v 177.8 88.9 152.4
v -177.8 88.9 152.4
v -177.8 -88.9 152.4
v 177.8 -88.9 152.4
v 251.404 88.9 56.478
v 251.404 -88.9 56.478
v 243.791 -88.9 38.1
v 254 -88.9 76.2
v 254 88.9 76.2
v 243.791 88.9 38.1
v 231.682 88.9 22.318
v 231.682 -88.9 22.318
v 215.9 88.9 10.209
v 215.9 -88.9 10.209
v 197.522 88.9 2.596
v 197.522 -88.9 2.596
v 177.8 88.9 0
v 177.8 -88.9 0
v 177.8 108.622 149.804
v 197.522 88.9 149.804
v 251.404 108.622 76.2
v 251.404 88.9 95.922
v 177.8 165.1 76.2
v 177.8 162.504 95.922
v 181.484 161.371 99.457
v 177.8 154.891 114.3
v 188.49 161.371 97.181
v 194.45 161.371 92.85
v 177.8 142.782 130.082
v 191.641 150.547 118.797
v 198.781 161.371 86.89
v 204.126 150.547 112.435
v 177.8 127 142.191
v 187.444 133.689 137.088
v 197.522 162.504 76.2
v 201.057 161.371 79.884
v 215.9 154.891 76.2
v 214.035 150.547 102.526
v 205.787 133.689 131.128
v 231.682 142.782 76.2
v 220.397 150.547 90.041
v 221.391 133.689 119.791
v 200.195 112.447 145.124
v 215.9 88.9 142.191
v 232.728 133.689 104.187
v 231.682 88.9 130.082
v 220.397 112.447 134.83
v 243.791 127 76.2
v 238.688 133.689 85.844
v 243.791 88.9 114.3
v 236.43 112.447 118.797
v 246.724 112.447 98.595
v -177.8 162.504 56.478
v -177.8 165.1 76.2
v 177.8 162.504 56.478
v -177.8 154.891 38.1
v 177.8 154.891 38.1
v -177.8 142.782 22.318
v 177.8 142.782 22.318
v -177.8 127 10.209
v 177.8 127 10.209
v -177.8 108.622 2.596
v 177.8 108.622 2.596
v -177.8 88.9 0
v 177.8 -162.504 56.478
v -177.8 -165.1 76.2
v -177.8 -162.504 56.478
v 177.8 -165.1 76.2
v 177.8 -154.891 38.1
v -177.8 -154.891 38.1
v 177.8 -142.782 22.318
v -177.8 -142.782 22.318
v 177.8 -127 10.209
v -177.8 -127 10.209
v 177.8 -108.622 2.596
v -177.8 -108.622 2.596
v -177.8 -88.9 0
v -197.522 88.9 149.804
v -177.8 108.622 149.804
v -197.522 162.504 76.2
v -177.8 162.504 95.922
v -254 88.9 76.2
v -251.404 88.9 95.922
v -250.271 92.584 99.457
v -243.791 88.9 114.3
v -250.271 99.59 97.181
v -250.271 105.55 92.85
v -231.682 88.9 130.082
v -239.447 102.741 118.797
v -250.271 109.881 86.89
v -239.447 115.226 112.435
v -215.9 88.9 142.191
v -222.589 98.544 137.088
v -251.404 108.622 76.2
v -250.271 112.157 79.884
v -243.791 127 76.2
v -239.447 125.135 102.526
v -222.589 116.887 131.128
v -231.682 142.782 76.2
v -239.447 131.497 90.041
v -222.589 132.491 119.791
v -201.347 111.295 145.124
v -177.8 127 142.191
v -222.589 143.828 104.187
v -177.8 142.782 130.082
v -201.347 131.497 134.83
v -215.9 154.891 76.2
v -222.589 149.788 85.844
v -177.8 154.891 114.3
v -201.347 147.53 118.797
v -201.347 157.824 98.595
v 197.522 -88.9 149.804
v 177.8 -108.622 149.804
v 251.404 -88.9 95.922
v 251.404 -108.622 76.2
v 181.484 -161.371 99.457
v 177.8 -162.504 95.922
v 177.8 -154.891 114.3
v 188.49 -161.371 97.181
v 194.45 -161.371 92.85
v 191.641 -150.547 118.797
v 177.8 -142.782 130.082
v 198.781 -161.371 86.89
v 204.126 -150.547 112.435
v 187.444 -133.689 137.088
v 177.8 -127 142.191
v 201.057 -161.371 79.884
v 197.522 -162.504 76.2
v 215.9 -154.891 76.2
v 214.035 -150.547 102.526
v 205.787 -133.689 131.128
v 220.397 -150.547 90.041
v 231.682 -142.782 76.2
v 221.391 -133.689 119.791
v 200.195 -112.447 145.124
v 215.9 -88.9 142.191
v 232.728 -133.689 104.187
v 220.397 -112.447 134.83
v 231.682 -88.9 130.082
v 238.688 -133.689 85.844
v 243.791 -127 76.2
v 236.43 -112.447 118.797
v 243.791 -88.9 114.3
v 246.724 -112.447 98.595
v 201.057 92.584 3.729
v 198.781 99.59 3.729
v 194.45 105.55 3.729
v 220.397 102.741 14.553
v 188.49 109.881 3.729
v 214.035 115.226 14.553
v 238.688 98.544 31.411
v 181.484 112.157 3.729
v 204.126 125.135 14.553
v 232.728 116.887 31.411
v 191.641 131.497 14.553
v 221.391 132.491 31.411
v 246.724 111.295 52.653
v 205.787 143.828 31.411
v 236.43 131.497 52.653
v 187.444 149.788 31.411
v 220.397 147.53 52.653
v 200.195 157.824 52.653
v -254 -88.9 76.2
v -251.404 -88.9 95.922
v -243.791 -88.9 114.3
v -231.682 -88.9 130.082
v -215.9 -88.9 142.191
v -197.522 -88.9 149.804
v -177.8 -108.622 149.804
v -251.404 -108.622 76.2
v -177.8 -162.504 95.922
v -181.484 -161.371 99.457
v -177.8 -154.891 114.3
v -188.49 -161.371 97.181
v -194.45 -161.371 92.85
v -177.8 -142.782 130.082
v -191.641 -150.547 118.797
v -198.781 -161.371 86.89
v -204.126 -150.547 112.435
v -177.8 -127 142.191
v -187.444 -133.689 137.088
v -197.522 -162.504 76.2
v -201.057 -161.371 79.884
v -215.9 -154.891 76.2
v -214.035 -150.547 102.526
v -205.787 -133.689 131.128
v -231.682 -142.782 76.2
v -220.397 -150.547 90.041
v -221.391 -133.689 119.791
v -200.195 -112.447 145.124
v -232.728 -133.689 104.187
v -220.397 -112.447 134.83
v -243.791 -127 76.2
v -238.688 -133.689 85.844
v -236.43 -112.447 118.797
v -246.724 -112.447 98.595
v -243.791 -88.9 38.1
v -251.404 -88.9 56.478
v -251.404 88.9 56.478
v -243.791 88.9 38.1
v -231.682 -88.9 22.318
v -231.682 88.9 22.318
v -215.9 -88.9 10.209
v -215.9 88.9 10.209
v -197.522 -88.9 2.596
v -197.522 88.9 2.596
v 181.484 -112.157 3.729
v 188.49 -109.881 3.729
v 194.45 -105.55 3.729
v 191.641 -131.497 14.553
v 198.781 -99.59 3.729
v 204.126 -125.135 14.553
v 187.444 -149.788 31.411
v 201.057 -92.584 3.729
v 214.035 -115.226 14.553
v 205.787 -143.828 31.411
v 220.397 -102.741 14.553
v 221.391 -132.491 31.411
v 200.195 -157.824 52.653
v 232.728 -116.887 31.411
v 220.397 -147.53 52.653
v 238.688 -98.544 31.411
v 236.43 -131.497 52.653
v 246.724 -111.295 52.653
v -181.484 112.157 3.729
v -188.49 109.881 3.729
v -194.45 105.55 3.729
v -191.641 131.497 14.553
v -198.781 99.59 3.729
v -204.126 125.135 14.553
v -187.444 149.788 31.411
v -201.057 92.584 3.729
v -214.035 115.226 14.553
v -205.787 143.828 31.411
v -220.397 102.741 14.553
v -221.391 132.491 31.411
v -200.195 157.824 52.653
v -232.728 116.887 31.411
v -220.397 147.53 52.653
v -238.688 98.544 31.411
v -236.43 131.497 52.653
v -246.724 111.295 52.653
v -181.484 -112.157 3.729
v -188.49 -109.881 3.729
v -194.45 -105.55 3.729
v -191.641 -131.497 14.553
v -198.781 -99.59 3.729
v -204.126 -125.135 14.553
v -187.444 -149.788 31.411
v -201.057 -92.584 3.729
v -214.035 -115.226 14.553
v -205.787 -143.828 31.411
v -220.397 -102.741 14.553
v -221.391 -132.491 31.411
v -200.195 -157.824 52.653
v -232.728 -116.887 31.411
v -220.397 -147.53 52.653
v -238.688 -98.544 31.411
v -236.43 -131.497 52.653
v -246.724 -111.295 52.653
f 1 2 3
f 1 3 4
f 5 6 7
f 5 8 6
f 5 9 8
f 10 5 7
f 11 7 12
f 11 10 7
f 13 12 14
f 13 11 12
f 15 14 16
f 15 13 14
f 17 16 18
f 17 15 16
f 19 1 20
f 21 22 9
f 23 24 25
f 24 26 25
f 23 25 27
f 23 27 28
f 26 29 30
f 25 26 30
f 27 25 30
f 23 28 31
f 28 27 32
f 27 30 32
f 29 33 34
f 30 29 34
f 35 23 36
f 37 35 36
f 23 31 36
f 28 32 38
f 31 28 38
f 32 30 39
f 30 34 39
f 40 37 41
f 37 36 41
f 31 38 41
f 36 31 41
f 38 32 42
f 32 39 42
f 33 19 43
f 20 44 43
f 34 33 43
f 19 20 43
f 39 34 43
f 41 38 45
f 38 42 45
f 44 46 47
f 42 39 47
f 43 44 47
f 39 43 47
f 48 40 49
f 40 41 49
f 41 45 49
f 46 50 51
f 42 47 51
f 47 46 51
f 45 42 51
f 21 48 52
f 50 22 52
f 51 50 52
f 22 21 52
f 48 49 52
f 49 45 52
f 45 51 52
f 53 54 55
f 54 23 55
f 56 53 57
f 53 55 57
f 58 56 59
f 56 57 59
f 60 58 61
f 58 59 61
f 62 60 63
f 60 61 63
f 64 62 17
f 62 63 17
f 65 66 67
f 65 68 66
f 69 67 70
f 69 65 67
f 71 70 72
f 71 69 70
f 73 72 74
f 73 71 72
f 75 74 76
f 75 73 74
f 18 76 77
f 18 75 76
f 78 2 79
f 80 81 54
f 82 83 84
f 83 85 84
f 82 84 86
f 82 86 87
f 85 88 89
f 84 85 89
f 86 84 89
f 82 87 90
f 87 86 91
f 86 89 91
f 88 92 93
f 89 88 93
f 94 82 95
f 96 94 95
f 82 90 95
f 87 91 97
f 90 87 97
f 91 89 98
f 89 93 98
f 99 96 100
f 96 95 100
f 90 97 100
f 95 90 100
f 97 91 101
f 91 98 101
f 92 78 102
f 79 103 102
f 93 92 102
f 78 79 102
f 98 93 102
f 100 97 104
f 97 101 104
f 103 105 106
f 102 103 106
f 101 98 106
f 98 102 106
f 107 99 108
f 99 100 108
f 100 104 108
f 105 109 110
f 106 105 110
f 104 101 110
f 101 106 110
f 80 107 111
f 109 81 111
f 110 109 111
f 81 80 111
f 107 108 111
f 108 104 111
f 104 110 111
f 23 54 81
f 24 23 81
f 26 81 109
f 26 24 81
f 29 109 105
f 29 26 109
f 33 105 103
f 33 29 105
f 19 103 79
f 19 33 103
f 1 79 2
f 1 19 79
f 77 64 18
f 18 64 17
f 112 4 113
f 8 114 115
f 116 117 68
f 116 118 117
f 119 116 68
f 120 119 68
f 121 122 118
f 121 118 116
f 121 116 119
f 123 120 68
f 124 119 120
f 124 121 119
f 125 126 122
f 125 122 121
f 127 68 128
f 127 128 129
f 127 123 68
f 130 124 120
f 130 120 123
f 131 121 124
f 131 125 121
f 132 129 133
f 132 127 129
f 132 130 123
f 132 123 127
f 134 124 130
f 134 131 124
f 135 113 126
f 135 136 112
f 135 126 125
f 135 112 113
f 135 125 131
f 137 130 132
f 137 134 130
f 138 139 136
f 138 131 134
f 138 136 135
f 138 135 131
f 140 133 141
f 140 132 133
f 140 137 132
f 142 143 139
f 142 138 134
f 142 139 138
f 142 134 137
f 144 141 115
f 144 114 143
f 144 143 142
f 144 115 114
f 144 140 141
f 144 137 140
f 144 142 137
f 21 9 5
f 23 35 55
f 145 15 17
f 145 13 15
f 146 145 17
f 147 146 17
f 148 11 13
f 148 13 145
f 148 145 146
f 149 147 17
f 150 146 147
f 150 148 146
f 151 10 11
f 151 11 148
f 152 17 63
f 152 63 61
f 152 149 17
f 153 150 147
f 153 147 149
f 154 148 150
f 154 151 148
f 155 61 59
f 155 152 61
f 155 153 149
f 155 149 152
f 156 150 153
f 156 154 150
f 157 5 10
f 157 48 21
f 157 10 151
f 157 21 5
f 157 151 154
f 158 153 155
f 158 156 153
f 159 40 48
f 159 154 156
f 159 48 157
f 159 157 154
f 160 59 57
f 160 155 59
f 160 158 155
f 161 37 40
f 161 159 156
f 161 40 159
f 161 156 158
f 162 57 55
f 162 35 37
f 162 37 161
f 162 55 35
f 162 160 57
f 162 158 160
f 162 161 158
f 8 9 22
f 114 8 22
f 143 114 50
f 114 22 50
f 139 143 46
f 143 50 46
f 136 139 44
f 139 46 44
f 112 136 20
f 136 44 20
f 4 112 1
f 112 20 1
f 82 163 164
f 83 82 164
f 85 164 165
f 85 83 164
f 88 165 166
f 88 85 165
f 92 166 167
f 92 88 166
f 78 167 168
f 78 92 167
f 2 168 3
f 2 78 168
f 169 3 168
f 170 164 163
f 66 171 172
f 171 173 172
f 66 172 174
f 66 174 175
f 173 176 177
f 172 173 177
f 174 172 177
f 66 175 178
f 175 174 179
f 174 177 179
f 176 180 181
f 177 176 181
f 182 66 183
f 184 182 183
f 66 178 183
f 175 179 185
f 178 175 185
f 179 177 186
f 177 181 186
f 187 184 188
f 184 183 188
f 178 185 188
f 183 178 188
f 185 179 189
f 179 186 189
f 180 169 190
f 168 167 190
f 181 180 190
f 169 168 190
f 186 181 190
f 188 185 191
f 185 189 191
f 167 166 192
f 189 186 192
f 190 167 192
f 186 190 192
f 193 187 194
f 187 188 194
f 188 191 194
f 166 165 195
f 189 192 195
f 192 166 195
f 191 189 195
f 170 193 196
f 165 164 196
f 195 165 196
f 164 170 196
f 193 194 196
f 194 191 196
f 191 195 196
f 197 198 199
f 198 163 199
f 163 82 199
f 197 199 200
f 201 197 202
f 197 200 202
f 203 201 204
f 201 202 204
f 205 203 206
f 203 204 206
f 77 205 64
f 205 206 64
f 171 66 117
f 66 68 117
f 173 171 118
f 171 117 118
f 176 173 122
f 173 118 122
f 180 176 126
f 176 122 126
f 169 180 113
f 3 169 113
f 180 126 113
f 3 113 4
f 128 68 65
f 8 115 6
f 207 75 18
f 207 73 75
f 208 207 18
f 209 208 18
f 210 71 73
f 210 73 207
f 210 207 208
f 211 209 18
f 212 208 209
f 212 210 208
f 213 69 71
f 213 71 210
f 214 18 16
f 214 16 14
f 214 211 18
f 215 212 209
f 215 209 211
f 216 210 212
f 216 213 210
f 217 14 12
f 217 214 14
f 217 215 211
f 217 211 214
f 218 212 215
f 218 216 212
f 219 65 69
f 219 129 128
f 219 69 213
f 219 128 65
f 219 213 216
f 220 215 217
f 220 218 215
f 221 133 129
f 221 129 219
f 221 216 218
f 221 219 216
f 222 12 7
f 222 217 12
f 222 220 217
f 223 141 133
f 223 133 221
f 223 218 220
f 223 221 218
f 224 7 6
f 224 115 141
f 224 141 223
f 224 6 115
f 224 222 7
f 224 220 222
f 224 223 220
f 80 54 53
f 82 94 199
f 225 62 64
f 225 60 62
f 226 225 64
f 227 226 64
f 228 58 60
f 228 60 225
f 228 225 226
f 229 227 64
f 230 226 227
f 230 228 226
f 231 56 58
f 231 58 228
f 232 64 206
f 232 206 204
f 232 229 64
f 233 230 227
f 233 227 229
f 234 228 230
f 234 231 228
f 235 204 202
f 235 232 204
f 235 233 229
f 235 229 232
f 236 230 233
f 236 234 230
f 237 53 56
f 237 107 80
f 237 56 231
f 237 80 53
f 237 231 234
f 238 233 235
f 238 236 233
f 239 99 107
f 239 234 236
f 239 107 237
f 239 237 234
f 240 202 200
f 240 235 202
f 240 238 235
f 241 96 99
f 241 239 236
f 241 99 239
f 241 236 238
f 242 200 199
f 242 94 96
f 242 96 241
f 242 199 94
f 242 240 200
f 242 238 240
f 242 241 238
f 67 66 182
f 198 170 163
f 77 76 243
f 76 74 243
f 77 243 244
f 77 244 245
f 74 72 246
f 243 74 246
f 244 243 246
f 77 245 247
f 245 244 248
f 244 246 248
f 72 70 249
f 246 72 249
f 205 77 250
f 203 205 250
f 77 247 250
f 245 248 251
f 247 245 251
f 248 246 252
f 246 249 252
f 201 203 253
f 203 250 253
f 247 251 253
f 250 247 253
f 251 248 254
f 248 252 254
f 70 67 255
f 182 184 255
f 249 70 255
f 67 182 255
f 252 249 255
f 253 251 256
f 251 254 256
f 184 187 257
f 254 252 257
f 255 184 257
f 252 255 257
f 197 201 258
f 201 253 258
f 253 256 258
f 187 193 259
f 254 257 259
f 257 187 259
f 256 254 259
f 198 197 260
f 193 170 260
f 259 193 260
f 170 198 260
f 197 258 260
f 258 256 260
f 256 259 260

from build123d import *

# Parameters (mm, degrees)
F0_W     = 508
F0_H     = 330.2
F1_DEPTH = 152.4
F2_R     = 76.19999


# Not quite as in the source:
# - a fillet or chamfer is up to 0.001 mm smaller than in the source, because OpenCascade refuses the exact size


with BuildPart() as f1:
    # F0 (on Top) → F1 (new body)
    with BuildSketch(Plane.XY):
        Rectangle(F0_W, F0_H)
    extrude(amount=F1_DEPTH)

    # F2 (radius 76.2 in the source; OpenCascade refuses exactly that, so slightly less here)
    f2_edges = [f1.edges().sort_by_distance(p)[0] for p in [
        (254, 0, 152.4),
        (0, 165.1, 152.4),
        (-254, 0, 152.4),
        (0, -165.1, 152.4),
        (-254, -165.1, 76.2),
        (254, -165.1, 76.2),
        (0, -165.1, 0),
        (254, 165.1, 76.2),
        (254, 0, 0),
        (-254, 165.1, 76.2),
        (0, 165.1, 0),
        (-254, 0, 0),
    ]]
    fillet(f2_edges, radius=F2_R)


solid = f1.part
